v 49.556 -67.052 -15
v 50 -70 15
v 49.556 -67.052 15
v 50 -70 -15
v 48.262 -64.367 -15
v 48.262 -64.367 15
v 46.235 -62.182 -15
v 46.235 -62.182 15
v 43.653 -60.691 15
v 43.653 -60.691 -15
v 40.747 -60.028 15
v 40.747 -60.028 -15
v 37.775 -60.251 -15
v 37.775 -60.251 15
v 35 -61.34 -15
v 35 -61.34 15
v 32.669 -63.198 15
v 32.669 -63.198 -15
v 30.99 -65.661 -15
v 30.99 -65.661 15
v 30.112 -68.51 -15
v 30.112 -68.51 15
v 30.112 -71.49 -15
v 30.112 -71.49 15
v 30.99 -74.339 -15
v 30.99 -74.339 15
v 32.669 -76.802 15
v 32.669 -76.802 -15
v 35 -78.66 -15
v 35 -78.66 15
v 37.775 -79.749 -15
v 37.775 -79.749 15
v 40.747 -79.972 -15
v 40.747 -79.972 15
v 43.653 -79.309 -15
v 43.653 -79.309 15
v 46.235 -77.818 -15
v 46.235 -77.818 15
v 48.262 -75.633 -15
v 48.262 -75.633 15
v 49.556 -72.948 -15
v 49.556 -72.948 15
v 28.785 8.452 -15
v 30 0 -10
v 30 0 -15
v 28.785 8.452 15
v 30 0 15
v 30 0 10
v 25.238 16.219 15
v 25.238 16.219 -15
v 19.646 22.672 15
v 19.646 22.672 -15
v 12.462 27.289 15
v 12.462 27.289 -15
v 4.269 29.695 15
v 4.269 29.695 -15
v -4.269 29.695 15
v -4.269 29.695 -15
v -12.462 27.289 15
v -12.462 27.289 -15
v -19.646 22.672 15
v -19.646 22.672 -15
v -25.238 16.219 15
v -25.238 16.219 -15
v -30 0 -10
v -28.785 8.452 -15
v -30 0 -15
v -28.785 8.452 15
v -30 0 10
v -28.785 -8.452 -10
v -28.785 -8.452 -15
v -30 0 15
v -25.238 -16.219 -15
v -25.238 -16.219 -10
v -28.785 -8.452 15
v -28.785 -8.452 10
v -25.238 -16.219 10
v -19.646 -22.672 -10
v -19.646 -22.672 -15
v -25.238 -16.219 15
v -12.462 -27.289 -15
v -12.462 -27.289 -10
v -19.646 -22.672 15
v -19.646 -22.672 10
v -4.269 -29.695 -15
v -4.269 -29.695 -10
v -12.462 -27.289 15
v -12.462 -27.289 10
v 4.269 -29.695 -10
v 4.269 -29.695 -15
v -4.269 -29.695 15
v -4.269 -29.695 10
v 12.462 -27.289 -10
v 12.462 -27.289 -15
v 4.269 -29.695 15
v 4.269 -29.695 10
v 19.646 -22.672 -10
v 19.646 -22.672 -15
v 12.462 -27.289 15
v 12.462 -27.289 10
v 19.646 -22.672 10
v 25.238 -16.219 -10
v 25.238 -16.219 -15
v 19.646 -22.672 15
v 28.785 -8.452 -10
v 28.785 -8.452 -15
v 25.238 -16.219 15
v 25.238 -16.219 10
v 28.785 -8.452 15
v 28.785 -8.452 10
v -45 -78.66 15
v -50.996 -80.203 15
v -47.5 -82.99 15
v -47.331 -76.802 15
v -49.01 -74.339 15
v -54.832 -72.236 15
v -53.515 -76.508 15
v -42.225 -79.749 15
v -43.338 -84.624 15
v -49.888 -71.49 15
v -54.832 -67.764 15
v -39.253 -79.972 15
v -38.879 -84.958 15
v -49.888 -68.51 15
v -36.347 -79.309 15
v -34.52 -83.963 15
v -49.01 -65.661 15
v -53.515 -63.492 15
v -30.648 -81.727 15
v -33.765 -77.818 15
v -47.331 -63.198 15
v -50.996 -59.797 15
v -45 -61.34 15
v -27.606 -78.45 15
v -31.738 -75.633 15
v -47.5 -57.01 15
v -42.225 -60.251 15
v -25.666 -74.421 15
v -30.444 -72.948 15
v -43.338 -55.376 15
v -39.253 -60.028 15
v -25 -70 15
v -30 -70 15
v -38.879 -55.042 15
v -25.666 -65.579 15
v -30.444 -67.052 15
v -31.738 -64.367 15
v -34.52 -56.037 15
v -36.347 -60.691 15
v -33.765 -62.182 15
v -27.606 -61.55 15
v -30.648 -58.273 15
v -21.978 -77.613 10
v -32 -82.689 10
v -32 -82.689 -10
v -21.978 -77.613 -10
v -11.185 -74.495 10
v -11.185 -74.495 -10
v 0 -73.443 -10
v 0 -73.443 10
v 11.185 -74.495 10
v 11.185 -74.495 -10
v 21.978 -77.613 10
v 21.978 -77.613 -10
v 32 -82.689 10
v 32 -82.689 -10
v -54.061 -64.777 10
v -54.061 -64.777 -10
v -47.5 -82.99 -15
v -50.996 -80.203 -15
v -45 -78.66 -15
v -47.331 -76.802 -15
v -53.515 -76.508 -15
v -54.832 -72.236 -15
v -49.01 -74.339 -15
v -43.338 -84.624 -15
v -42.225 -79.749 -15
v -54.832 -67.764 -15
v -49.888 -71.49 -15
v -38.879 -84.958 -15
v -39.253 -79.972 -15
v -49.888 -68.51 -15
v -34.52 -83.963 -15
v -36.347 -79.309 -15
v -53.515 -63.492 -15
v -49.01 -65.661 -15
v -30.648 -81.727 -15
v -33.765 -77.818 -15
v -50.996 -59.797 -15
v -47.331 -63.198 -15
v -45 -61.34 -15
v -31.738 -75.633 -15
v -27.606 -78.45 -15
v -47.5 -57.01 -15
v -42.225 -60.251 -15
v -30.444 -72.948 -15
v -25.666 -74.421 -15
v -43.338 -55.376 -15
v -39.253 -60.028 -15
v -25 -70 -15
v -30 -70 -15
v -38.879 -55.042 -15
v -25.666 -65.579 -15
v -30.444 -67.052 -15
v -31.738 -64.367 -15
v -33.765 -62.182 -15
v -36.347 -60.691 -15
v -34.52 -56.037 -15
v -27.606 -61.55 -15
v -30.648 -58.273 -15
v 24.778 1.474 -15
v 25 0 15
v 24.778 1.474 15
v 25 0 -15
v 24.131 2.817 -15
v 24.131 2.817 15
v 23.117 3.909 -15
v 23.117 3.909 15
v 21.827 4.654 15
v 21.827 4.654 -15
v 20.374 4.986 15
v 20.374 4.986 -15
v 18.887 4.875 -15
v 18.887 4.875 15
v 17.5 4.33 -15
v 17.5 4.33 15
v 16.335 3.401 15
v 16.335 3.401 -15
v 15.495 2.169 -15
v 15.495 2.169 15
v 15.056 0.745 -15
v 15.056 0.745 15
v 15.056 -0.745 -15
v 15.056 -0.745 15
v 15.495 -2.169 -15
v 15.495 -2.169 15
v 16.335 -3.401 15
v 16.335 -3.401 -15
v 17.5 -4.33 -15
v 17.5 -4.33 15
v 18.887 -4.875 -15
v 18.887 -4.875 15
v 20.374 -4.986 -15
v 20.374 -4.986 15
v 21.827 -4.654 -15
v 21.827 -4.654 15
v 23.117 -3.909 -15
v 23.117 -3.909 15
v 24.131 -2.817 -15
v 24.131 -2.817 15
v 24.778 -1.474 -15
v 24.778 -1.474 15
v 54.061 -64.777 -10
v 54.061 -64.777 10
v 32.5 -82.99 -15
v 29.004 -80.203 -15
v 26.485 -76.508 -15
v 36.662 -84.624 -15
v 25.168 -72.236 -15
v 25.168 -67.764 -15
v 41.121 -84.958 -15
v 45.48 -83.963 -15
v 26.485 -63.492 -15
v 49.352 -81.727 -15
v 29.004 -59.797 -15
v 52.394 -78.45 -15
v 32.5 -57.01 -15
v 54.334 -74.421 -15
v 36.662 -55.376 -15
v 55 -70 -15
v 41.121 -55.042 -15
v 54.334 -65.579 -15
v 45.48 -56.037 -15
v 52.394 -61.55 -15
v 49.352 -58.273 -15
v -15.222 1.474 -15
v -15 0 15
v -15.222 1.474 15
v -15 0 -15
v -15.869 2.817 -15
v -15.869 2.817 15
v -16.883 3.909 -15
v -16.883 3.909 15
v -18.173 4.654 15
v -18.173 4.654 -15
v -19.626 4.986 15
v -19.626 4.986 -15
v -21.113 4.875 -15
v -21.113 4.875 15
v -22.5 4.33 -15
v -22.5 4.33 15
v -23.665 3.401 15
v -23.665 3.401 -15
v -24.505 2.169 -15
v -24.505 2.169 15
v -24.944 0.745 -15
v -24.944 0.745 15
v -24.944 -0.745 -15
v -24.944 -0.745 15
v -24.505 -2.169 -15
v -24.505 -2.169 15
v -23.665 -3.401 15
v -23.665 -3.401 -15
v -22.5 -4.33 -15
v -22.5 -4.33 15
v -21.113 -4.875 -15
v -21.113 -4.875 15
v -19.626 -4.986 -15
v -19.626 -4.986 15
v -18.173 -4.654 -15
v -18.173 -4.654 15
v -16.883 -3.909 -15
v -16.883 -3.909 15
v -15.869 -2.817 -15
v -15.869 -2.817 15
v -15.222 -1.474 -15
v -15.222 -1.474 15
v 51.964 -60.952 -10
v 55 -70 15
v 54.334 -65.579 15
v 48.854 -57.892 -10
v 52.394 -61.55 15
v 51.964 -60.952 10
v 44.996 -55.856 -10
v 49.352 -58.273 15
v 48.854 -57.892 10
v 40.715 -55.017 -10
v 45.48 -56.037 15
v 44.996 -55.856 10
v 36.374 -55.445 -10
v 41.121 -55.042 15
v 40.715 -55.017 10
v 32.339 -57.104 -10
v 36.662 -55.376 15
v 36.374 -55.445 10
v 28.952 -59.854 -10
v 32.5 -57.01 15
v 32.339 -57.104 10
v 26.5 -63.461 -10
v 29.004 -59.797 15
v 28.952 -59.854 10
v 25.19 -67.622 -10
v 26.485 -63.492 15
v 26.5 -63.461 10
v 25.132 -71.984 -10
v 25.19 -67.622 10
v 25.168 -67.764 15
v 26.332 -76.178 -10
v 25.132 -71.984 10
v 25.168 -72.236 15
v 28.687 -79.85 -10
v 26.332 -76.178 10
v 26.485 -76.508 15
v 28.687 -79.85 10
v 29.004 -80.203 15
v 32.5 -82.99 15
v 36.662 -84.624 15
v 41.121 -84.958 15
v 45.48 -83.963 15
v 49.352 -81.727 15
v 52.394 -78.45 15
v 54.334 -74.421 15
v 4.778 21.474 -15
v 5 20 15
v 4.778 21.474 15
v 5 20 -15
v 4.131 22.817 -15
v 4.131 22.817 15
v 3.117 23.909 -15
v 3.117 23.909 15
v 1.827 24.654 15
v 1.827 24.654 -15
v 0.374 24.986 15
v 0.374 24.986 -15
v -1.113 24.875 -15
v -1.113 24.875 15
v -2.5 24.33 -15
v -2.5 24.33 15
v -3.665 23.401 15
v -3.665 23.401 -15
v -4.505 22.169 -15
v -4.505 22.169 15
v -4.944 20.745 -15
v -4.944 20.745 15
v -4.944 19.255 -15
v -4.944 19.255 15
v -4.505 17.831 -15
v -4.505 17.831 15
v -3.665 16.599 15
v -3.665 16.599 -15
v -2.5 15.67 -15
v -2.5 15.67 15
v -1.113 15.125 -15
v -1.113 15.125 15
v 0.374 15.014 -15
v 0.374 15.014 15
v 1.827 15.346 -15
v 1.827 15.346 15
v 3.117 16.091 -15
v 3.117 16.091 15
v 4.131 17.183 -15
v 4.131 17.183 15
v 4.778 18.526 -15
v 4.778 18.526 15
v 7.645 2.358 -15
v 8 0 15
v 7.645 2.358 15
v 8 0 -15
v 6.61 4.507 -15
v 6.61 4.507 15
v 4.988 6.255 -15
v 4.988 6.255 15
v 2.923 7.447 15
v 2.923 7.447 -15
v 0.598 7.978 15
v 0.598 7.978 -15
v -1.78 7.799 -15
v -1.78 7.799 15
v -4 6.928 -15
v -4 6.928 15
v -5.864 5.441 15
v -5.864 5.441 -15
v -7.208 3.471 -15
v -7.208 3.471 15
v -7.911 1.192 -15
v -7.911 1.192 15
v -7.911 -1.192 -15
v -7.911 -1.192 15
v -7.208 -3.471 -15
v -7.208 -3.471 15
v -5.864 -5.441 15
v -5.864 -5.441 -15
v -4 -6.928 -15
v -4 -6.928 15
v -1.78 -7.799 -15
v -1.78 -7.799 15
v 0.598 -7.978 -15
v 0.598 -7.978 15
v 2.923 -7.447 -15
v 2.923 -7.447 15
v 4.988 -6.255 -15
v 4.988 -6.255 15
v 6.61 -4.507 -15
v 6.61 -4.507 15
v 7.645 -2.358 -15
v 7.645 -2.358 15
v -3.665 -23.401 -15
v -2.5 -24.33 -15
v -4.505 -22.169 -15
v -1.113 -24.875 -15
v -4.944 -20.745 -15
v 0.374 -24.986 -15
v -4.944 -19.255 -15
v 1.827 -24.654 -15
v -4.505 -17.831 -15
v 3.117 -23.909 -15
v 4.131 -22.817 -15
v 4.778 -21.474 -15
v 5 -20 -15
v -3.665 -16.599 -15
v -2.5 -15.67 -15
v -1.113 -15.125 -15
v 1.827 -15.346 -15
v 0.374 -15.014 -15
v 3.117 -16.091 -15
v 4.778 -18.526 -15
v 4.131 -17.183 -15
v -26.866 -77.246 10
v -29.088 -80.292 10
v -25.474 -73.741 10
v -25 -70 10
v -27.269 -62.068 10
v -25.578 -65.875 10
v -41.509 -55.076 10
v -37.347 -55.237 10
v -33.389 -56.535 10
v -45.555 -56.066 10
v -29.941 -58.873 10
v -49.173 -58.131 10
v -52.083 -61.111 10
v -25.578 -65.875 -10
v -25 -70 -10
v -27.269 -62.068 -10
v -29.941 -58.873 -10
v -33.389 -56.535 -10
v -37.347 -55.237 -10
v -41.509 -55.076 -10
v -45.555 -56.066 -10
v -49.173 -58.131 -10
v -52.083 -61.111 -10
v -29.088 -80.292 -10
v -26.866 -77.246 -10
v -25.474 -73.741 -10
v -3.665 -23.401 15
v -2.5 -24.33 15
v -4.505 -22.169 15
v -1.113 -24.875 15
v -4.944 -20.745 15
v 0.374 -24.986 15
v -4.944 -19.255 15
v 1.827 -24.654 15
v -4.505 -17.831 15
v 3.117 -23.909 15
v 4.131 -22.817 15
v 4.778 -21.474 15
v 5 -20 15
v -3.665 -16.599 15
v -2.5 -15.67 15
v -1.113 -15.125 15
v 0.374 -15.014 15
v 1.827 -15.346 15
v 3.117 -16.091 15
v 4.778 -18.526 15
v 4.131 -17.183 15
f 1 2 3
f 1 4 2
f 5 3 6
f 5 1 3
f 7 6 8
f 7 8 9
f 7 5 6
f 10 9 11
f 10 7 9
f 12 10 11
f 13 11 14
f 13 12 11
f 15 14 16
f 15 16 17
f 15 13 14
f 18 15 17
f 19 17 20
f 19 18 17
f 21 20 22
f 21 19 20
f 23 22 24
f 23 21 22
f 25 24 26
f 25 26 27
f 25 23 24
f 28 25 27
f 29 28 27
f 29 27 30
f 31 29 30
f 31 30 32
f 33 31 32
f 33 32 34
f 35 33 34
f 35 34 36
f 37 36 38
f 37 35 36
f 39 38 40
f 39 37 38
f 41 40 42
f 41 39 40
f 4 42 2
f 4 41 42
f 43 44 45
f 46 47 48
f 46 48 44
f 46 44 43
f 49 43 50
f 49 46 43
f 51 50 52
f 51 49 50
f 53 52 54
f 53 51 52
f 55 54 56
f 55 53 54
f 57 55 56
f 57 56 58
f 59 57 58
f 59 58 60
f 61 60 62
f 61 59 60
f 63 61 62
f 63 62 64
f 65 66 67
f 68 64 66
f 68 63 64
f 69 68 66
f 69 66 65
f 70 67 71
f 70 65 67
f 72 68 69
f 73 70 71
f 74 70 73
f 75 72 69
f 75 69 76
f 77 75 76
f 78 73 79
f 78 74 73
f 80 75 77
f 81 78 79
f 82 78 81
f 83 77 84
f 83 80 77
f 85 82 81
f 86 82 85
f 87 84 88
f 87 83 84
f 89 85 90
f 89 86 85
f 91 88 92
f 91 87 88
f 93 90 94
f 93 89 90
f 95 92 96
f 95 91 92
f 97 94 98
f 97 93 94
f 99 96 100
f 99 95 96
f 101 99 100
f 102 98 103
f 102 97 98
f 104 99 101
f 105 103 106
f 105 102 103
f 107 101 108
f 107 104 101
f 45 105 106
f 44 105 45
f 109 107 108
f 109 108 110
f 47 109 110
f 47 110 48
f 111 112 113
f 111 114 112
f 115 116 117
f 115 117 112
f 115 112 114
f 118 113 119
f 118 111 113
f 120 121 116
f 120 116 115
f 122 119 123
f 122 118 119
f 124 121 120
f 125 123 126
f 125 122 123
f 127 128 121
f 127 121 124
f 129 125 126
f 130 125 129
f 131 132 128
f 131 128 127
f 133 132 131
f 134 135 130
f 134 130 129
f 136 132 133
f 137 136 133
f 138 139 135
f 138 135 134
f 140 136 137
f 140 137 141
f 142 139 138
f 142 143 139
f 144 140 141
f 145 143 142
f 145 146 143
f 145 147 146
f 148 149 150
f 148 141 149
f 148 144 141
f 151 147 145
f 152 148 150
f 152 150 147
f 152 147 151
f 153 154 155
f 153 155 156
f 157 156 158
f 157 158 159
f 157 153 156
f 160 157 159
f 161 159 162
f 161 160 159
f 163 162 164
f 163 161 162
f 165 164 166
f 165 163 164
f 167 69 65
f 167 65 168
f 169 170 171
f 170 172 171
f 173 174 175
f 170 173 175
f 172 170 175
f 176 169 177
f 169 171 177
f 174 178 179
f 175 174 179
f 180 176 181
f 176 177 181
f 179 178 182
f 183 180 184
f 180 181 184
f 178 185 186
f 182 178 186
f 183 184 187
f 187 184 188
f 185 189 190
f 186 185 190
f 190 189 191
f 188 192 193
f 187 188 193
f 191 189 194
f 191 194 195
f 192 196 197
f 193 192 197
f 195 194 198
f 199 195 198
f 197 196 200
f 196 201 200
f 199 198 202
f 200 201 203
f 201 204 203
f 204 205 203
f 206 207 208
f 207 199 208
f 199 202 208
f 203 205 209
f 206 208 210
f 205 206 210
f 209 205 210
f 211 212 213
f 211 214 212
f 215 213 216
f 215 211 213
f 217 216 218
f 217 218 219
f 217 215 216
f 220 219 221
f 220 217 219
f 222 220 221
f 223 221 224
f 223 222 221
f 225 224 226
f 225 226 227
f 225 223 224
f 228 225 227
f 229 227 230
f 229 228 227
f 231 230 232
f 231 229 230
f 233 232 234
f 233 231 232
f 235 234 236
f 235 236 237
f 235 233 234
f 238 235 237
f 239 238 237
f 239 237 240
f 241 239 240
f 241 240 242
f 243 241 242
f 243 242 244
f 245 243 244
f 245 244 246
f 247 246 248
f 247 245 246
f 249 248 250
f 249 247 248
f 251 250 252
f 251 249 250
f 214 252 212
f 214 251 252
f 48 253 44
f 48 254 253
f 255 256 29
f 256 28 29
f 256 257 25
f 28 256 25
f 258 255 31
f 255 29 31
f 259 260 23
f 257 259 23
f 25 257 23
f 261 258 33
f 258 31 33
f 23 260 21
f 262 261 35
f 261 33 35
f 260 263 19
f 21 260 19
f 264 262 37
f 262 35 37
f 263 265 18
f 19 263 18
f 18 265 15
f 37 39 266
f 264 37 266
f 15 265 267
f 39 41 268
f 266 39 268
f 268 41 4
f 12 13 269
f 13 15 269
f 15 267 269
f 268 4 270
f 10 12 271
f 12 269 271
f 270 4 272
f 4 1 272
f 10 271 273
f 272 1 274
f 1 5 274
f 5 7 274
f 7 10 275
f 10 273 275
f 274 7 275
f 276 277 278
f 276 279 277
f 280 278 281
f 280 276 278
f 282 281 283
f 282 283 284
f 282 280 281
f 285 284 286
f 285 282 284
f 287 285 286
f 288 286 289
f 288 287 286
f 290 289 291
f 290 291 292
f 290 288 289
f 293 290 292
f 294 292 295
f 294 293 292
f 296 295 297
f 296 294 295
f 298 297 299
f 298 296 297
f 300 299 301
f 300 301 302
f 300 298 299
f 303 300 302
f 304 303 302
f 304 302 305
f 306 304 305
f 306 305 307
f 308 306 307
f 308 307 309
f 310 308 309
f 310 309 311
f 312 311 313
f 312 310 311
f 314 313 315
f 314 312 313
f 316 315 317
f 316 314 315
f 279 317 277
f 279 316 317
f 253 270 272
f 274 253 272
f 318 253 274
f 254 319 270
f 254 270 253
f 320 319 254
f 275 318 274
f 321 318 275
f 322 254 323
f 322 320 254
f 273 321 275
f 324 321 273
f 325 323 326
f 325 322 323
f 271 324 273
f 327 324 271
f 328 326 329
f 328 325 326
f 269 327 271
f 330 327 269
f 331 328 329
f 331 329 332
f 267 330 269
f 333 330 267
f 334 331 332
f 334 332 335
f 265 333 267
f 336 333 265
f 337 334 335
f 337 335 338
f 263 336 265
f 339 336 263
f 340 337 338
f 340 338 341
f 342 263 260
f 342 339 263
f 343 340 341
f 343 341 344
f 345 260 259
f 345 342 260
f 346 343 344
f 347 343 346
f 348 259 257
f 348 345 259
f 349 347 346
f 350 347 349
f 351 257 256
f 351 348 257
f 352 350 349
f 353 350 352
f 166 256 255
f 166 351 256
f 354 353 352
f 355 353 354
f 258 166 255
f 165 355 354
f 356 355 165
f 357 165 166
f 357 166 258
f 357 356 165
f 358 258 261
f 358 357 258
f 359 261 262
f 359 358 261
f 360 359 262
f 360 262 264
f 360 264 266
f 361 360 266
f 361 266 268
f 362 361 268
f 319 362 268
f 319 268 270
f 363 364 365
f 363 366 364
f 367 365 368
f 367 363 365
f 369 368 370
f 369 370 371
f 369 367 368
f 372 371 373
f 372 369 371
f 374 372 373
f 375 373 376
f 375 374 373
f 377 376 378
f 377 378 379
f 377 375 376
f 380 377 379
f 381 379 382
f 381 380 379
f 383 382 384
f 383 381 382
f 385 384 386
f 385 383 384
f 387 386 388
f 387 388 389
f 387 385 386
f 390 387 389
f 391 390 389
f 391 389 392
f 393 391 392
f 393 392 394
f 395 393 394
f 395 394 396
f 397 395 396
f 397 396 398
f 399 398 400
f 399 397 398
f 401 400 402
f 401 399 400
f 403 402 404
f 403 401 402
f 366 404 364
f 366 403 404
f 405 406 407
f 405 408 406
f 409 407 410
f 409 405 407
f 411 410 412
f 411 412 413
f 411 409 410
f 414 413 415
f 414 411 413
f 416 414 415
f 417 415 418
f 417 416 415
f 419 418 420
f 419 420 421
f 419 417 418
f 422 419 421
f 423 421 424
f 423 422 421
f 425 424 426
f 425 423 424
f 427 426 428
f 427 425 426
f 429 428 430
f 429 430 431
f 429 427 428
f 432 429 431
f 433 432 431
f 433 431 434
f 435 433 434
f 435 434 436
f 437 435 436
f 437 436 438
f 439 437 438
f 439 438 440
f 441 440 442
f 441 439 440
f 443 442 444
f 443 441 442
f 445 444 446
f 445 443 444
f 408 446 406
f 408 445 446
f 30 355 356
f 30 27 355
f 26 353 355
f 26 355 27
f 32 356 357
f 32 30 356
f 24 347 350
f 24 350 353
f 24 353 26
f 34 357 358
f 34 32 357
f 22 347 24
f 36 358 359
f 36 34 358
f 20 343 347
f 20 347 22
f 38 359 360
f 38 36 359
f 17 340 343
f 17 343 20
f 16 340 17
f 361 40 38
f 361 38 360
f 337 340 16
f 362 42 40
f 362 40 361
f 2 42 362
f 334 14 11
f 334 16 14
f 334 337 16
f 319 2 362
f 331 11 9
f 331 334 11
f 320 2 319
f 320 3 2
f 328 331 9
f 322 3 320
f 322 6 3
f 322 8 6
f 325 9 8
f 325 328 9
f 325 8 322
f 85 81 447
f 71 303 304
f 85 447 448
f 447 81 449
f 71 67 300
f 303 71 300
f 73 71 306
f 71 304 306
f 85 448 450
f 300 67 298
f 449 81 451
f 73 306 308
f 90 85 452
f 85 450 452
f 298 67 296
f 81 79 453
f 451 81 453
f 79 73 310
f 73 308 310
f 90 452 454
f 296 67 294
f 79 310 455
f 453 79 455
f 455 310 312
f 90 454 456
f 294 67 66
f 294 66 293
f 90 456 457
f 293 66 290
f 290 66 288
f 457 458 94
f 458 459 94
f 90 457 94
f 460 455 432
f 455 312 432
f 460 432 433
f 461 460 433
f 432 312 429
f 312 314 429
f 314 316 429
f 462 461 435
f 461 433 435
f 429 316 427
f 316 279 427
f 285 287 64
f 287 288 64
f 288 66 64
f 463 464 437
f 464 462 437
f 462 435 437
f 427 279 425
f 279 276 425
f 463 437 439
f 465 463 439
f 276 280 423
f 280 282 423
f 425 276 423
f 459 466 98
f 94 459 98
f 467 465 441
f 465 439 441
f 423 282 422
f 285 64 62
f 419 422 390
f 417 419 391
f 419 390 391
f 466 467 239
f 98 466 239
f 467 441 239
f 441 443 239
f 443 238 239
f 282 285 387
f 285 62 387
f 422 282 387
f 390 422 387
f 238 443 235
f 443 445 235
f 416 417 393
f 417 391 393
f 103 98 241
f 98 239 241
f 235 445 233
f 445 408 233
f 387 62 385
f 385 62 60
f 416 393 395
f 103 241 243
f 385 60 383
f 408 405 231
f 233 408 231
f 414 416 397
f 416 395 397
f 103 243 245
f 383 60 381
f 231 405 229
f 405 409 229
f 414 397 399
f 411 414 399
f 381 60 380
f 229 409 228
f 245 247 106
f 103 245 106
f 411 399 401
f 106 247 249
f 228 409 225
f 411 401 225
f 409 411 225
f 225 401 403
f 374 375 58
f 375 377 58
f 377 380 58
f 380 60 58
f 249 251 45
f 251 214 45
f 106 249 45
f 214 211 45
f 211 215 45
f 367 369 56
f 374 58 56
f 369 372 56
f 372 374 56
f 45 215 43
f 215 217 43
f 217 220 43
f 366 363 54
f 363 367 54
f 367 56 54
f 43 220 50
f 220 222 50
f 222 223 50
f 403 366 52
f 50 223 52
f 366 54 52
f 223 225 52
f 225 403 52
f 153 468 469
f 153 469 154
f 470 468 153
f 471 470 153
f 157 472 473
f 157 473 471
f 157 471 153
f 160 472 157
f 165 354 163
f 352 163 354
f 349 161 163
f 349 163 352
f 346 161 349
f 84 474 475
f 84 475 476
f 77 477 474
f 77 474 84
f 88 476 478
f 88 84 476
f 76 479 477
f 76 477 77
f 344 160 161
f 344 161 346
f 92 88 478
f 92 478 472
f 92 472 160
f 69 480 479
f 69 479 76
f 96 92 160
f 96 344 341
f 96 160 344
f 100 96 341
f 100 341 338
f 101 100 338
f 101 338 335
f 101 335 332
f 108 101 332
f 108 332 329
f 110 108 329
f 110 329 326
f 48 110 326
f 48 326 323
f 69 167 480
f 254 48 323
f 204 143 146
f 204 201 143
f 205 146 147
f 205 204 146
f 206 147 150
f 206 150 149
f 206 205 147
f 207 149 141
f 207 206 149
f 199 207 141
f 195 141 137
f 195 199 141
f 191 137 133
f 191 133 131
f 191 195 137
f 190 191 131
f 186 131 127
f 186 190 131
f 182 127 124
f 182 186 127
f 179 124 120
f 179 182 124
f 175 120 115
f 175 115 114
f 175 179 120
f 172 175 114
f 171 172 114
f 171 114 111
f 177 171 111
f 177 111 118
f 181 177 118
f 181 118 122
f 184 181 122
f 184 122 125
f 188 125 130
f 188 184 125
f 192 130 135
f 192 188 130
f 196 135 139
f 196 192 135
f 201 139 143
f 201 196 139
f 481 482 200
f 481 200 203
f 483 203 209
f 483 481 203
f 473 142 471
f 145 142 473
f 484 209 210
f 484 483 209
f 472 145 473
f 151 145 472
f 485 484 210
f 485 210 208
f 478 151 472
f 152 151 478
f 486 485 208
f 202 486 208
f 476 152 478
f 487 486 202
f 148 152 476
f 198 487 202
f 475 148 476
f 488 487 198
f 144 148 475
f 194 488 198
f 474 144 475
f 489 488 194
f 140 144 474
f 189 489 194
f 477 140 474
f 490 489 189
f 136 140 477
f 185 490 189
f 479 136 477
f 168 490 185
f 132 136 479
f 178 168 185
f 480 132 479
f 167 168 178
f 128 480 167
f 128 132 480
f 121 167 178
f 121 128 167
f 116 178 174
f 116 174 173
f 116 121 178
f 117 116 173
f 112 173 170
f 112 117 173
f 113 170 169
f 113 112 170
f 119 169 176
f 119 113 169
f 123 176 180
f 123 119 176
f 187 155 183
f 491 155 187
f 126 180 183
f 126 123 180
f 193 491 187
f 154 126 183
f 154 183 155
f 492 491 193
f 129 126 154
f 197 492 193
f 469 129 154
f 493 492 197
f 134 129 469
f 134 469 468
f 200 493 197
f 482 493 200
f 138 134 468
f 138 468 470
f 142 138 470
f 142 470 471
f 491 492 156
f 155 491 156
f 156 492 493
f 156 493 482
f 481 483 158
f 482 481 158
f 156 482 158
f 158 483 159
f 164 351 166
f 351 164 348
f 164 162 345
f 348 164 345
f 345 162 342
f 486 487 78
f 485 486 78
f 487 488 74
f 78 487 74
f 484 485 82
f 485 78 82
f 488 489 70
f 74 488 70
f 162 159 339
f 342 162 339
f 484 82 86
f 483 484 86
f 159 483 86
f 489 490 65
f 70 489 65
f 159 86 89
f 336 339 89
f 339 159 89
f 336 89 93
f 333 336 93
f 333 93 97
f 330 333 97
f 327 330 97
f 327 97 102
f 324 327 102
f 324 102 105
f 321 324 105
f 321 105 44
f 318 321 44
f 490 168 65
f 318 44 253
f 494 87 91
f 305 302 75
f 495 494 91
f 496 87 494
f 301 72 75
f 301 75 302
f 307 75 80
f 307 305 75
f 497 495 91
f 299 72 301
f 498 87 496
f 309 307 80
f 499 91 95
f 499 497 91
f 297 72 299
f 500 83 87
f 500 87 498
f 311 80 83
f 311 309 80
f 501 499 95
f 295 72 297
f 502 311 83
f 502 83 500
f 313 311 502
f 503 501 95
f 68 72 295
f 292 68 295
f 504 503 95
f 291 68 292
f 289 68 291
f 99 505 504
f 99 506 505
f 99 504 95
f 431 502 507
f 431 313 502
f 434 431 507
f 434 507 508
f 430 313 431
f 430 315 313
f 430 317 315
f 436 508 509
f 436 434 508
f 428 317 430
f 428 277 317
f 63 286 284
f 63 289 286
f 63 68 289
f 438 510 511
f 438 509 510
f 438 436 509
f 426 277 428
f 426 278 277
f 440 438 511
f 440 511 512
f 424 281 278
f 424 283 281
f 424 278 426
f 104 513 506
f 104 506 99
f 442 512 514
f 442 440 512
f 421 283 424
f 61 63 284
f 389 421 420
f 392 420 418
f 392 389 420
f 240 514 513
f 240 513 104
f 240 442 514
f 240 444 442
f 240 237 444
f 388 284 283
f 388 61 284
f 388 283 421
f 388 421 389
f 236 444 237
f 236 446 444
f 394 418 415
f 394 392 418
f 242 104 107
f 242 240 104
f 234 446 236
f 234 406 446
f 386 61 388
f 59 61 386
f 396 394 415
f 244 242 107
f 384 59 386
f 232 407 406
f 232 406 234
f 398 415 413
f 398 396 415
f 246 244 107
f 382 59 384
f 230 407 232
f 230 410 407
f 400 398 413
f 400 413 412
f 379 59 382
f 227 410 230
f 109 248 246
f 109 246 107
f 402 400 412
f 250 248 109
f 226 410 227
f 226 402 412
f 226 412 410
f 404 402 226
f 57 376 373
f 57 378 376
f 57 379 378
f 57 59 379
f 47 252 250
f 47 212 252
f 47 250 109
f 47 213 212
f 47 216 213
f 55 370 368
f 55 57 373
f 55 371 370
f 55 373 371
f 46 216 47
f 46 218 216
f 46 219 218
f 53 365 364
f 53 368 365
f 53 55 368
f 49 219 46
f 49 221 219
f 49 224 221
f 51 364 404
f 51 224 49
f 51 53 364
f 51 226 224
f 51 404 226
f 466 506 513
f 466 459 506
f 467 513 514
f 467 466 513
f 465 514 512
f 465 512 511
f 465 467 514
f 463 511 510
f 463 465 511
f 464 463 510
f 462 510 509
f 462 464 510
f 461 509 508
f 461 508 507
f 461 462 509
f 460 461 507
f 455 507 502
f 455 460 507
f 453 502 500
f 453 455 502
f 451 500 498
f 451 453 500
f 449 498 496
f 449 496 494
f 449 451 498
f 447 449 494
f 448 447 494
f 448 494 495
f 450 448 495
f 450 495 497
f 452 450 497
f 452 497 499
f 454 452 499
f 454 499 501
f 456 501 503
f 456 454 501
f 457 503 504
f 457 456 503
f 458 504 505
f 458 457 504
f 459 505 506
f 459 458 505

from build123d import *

# Parameters (mm, degrees)
SKETCH1_R             = 30
SKETCH1_R_2           = 5
SKETCH1_R_3           = 8
BOSS_EXTRUDE1_DEPTH   = 15
SKETCH1_R_4           = 15
SKETCH1_R_5           = 10
BOSS_EXTRUDE1_2_DEPTH = 15
BOSS_EXTRUDE1_3_DEPTH = 15
BOSS_EXTRUDE2_DEPTH   = 10


with BuildPart() as part:
    # Sketch1 → Boss-Extrude1 (new, symmetric)
    with BuildSketch(Plane.XY):
        Circle(SKETCH1_R)
        with Locations((0, -20)):
            Circle(SKETCH1_R_2, mode=Mode.SUBTRACT)
        with Locations((-20, 0)):
            Circle(SKETCH1_R_2, mode=Mode.SUBTRACT)
        Circle(SKETCH1_R_3, mode=Mode.SUBTRACT)
        with Locations((0, 20)):
            Circle(SKETCH1_R_2, mode=Mode.SUBTRACT)
        with Locations((20, 0)):
            Circle(SKETCH1_R_2, mode=Mode.SUBTRACT)
    extrude(amount=BOSS_EXTRUDE1_DEPTH, both=True)



with BuildPart() as body_2:
    # Sketch1 → Boss-Extrude1 2 (new, symmetric)
    with BuildSketch(Plane.XY):
        with Locations((-40, -70)):
            Circle(SKETCH1_R_4)
        with Locations((-40, -70)):
            Circle(SKETCH1_R_5, mode=Mode.SUBTRACT)
    extrude(amount=BOSS_EXTRUDE1_2_DEPTH, both=True)


with BuildPart() as body_3:
    # Sketch1 → Boss-Extrude1 3 (new, symmetric)
    with BuildSketch(Plane.XY):
        with Locations((40, -70)):
            Circle(SKETCH1_R_4)
        with Locations((40, -70)):
            Circle(SKETCH1_R_5, mode=Mode.SUBTRACT)
    extrude(amount=BOSS_EXTRUDE1_3_DEPTH, both=True)


with BuildPart() as part_1:
    add(part.part)

    add(body_2.part)  # Boss-Extrude2 merges body 2

    add(body_3.part)  # Boss-Extrude2 merges body 3
    # Sketch1<3> → Boss-Extrude2 (add, symmetric)
    with BuildSketch(Plane.XY):
        with BuildLine():
            ThreePointArc((30, 0), (0, -30), (-30, 0))
            Line((-30, 0), (-54.061288709, -64.776958756))
            ThreePointArc((-54.061288709, -64.776958756), (-37.3466371, -55.236542908), (-25, -70))
            ThreePointArc((-25, -70), (-26.866074463, -77.245688373), (-32, -82.68857754))
            ThreePointArc((-32, -82.68857754), (0, -73.442887702), (32, -82.68857754))
            ThreePointArc((32, -82.68857754), (30.545301323, -58.354886307), (54.061288709, -64.776958756))
            Line((54.061288709, -64.776958756), (30, 0))
        make_face()
    extrude(amount=BOSS_EXTRUDE2_DEPTH, both=True)


solid = part_1.part
